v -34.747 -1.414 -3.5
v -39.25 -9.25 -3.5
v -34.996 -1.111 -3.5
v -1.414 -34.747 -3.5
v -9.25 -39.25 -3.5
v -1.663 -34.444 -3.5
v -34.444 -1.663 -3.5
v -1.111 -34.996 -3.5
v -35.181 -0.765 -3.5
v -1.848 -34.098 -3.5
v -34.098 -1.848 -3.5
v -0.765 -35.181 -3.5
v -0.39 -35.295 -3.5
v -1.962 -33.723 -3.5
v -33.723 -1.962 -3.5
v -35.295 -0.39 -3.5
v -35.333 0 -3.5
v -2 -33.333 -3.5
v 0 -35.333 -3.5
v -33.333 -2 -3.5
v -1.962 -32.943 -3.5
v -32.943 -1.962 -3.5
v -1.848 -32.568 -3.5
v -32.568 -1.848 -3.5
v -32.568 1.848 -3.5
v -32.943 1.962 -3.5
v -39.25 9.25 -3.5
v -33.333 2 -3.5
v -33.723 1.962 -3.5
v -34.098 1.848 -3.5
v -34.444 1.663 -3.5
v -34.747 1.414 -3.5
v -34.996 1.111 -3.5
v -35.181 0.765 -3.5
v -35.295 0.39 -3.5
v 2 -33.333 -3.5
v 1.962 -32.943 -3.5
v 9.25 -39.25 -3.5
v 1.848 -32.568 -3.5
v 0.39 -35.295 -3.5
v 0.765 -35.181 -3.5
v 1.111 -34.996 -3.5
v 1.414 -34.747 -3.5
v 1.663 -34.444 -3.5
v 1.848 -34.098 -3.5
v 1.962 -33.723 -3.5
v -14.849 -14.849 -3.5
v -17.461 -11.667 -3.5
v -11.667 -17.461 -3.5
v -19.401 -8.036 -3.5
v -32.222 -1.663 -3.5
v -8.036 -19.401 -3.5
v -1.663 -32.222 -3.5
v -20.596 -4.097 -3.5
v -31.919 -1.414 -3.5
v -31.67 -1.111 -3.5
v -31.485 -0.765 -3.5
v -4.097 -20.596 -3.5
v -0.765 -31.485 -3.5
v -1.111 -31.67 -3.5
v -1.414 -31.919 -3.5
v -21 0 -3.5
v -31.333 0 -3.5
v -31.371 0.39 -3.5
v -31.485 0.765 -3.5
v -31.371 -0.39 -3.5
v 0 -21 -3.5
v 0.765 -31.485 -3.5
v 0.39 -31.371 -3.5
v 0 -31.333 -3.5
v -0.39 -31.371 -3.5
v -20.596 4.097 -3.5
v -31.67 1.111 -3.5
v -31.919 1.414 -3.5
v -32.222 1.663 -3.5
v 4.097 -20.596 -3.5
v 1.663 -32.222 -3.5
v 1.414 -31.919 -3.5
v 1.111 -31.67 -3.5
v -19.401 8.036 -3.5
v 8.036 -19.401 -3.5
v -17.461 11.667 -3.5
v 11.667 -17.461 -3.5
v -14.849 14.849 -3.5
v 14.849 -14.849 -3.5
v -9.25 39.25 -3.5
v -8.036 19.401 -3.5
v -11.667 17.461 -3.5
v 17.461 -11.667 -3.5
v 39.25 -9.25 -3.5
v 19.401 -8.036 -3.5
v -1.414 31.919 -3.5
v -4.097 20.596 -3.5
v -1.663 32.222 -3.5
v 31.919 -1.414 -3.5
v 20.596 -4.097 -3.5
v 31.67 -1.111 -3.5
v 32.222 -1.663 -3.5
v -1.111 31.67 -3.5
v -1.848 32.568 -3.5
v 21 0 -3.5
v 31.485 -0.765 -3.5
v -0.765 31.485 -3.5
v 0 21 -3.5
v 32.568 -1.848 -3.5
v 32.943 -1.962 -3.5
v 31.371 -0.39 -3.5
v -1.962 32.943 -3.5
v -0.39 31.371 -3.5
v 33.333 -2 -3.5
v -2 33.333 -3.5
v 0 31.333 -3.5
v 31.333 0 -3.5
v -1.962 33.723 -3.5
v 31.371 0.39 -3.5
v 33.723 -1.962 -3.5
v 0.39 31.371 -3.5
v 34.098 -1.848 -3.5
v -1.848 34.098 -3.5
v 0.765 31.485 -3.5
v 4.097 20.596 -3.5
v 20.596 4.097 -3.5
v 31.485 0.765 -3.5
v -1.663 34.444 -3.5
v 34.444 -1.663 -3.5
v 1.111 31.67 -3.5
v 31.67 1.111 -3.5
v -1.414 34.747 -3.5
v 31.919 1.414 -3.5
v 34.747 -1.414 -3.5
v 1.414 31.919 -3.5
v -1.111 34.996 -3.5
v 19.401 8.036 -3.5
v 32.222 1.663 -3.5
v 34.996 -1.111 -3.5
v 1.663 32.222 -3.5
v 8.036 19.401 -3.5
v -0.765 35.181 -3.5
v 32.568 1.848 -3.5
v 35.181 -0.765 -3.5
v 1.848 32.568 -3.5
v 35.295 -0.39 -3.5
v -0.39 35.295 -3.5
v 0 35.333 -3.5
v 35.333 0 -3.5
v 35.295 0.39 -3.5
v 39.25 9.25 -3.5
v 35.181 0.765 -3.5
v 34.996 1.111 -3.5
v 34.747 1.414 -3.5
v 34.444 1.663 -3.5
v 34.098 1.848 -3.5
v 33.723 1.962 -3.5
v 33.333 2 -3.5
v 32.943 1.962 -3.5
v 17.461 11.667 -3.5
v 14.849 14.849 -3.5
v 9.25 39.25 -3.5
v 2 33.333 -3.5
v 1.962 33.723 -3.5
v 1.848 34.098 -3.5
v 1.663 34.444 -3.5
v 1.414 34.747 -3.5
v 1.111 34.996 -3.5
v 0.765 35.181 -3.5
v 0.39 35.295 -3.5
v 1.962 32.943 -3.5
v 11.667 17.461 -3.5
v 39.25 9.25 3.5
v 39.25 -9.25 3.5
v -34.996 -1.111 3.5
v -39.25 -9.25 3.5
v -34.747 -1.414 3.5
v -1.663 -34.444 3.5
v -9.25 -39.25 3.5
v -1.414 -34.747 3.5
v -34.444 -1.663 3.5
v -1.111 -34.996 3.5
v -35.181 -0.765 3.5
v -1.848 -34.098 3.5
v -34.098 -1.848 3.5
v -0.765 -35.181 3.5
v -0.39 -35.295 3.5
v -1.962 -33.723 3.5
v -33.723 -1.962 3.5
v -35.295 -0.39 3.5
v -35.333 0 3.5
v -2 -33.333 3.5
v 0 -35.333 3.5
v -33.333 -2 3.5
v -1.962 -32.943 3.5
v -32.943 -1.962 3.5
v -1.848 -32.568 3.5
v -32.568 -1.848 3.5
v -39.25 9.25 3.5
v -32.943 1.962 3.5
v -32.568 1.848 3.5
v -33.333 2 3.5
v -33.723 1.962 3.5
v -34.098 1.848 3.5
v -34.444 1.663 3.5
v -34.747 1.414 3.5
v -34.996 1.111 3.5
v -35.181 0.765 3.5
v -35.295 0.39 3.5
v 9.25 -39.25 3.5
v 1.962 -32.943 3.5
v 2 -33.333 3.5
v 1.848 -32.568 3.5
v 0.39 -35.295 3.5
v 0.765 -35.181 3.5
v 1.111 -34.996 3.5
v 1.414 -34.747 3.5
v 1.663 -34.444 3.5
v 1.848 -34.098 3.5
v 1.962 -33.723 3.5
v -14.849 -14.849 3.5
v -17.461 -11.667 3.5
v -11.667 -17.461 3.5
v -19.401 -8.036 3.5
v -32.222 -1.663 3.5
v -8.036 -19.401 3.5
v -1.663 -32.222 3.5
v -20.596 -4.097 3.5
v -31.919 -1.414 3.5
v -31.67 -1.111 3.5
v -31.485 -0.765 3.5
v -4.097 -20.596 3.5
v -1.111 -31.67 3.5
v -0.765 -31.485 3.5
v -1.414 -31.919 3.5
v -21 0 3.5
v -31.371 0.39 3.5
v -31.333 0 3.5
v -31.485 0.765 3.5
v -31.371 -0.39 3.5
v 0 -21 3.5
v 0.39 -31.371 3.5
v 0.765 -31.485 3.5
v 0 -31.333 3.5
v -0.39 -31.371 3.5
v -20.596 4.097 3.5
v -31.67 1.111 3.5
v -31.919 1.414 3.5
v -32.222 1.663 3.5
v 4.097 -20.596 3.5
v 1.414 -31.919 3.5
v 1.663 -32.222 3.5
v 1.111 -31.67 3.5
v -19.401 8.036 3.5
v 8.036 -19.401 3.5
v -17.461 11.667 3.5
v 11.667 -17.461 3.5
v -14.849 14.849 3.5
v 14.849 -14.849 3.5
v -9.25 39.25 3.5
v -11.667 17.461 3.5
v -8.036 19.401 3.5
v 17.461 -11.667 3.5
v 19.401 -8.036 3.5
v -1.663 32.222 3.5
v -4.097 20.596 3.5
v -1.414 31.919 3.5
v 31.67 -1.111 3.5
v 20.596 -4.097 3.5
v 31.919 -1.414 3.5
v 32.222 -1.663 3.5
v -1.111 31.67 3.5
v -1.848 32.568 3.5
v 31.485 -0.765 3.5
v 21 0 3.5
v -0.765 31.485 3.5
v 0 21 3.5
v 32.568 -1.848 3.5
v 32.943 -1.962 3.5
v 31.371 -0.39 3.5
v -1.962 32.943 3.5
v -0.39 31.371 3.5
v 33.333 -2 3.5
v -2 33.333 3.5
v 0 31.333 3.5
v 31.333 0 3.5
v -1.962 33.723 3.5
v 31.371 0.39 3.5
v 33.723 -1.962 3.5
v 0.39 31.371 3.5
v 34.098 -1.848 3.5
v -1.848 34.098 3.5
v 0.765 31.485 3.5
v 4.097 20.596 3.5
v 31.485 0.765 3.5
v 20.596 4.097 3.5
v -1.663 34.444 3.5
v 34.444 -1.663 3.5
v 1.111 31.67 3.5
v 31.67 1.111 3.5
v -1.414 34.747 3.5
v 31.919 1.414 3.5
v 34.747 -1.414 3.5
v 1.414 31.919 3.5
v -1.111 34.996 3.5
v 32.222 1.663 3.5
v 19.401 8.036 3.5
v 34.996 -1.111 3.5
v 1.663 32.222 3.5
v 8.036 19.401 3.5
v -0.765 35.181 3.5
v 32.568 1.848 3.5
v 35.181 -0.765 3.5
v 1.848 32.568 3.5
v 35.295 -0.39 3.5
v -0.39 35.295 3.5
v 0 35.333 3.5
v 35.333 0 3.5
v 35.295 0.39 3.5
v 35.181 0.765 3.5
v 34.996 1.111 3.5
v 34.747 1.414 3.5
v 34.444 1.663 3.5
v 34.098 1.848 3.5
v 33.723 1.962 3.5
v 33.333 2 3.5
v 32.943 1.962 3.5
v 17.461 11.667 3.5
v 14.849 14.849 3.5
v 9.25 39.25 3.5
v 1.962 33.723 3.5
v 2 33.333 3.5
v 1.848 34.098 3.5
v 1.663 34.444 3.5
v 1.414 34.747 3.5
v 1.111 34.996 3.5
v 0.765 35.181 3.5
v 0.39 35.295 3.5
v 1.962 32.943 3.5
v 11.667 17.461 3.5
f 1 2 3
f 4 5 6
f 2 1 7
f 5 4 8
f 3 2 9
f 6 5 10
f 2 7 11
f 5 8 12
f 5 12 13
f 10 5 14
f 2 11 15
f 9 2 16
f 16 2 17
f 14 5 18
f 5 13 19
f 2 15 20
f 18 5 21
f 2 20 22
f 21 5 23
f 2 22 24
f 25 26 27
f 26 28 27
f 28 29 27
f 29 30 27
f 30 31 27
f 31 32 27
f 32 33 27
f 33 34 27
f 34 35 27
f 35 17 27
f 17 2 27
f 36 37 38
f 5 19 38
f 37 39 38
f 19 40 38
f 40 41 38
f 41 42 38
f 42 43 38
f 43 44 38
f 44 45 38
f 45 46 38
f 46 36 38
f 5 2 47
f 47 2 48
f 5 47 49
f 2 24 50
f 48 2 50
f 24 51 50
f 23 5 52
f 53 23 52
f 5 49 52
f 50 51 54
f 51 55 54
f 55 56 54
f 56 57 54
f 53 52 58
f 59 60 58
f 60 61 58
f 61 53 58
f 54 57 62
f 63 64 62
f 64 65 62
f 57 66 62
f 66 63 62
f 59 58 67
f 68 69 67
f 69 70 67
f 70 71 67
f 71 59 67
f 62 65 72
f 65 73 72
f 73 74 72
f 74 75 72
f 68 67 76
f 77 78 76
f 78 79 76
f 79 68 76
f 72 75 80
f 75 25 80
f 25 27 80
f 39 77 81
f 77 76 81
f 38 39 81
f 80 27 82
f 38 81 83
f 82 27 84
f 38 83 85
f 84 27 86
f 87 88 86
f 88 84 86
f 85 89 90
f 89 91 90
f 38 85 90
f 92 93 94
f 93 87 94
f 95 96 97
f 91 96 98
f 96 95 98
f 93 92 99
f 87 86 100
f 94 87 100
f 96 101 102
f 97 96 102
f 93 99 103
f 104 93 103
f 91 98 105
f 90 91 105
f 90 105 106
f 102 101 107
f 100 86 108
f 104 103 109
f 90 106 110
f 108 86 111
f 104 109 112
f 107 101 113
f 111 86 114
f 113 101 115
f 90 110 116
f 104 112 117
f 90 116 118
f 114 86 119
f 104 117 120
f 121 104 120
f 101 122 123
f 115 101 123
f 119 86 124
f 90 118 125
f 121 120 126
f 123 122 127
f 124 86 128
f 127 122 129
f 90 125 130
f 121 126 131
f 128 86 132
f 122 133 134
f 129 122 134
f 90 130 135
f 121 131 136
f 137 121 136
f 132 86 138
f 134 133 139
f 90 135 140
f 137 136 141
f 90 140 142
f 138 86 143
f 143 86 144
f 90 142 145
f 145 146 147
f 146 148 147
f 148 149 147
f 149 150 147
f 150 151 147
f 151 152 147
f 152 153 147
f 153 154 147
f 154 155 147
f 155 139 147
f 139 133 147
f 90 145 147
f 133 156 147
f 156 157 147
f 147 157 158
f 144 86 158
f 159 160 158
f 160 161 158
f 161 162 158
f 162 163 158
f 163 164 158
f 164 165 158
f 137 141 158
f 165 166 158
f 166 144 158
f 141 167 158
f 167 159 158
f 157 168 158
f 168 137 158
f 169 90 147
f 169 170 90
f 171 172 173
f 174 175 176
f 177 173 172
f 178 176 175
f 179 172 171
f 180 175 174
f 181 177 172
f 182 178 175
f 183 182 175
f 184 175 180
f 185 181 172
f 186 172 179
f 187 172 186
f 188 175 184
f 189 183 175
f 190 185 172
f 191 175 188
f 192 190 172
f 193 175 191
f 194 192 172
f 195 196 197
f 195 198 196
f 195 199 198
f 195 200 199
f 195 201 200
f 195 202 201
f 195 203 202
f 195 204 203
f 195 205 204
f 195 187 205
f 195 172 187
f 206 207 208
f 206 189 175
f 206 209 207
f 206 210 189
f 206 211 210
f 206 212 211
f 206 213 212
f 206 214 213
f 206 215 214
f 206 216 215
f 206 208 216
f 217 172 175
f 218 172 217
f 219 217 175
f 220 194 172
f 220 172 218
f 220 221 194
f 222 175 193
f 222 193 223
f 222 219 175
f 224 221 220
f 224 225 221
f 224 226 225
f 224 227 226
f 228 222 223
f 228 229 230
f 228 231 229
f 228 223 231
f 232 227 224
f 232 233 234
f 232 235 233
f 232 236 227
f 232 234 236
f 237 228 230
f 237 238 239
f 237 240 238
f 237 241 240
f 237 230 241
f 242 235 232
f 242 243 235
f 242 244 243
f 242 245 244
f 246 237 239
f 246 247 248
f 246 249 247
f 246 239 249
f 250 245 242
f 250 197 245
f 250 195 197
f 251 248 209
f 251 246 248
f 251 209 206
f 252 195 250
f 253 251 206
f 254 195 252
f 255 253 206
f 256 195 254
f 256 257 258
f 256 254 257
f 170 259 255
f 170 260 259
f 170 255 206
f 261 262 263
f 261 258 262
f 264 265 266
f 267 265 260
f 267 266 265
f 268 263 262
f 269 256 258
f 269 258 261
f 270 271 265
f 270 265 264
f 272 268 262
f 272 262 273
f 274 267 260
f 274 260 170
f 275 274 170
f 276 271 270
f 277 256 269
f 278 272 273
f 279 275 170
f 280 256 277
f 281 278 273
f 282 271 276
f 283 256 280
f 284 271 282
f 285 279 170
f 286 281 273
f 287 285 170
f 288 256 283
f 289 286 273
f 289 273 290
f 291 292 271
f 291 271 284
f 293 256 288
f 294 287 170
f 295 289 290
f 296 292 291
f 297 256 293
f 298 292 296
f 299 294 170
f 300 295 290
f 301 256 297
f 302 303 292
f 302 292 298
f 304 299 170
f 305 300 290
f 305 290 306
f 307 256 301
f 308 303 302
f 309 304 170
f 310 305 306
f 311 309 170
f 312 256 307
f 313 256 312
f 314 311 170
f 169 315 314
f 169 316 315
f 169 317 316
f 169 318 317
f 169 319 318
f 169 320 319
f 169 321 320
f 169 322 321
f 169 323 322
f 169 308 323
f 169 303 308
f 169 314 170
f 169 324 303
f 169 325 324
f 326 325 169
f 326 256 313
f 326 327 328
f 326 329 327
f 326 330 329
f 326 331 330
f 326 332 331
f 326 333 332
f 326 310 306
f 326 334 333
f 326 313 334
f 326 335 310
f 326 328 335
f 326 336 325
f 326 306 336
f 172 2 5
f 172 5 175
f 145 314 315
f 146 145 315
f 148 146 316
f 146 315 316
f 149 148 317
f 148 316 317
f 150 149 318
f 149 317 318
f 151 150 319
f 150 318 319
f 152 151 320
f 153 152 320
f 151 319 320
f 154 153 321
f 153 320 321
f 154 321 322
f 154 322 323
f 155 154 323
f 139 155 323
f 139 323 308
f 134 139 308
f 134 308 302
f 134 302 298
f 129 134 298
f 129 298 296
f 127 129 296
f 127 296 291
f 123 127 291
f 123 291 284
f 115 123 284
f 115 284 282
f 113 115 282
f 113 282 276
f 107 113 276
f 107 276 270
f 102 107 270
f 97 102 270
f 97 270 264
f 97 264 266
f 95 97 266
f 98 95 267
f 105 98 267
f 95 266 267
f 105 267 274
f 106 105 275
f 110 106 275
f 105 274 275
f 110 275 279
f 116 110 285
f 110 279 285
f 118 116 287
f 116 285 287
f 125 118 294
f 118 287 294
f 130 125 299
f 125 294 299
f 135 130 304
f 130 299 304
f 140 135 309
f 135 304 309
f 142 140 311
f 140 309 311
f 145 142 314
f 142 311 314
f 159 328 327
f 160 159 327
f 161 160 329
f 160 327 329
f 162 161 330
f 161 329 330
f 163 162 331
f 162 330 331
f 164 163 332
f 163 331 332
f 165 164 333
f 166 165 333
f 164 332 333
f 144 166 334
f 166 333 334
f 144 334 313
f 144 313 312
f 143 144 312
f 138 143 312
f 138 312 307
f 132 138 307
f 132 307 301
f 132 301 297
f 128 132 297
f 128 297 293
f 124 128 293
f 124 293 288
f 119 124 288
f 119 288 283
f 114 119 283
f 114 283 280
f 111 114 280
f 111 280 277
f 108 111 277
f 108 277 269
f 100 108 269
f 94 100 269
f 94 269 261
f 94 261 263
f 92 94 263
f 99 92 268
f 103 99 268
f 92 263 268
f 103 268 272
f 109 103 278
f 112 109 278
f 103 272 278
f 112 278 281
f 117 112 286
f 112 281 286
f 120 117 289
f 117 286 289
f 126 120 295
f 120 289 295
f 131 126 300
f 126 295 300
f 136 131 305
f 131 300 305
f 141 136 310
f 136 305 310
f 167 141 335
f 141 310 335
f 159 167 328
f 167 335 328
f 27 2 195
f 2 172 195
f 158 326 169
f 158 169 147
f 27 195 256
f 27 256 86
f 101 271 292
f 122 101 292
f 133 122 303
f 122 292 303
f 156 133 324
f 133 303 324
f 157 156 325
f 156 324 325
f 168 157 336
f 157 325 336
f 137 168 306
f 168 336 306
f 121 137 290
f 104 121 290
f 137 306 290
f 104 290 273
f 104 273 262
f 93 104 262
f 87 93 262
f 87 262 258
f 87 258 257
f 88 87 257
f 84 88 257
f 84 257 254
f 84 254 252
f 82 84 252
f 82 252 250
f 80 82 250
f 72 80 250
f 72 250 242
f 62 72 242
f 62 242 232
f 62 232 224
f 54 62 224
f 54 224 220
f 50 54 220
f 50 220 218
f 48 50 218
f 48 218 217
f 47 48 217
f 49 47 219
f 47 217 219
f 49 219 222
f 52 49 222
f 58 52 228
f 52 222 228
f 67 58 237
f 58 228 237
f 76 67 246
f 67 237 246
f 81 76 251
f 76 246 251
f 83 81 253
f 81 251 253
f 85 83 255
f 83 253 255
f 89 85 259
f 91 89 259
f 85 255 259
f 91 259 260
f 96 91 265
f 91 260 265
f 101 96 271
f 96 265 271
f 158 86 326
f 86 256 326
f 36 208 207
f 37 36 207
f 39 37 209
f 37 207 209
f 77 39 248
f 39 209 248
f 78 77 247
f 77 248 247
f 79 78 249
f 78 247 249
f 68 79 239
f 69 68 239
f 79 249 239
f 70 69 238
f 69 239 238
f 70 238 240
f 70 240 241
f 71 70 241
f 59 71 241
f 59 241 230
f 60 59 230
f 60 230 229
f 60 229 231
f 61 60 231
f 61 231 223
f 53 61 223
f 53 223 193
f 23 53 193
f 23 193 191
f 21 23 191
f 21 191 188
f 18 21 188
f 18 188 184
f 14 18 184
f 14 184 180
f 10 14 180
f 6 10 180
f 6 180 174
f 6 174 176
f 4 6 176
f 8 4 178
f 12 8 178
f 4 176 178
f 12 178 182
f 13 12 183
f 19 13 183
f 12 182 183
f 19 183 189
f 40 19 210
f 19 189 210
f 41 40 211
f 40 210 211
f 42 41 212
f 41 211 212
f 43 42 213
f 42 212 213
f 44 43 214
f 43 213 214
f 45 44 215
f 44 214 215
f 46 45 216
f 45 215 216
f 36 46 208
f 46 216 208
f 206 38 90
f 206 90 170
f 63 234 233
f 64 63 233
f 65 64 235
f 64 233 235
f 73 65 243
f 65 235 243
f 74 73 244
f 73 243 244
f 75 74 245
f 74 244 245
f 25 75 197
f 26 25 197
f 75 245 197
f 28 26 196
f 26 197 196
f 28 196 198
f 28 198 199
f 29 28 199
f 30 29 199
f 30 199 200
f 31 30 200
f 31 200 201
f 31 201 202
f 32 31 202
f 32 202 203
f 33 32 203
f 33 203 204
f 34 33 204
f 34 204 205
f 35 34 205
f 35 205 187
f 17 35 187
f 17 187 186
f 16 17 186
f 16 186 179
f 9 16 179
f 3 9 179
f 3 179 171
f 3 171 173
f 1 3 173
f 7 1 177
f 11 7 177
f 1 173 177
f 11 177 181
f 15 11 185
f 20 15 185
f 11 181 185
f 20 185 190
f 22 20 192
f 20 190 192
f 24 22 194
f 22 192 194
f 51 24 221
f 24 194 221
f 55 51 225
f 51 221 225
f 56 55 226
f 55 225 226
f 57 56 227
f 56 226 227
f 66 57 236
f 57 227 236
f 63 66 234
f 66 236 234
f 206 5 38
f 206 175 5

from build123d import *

# Parameters (mm, degrees)
SKETCH1_W           = 78.5
SKETCH1_H           = 78.5
BOSS_EXTRUDE1_DEPTH = 3.5
SKETCH3_R           = 21
CUT_EXTRUDE2_DEPTH  = 56.947520052
SKETCH4_R           = 2
CUT_EXTRUDE3_DEPTH  = 56.947520052
CHAMFER1_SIZE       = 30


with BuildPart() as part:
    # Sketch1 → Boss-Extrude1 (new, symmetric)
    with BuildSketch(Plane.XY):
        Rectangle(SKETCH1_W, SKETCH1_H)
    extrude(amount=BOSS_EXTRUDE1_DEPTH, both=True)

    # Sketch3 → Cut-Extrude2 (cut, through all)
    with BuildSketch(Plane.XY.offset(3.5)):
        Circle(SKETCH3_R)
    extrude(amount=-CUT_EXTRUDE2_DEPTH, mode=Mode.SUBTRACT)

    # Sketch4 → Cut-Extrude3 (cut, through all)
    with BuildSketch(Plane.XY.offset(3.5)):
        with Locations((0, 33.333013665)):
            Circle(SKETCH4_R)
        with Locations((-33.333013665, 0)):
            Circle(SKETCH4_R)
        with Locations((0, -33.333013665)):
            Circle(SKETCH4_R)
        with Locations((33.333013665, 0)):
            Circle(SKETCH4_R)
    extrude(amount=-CUT_EXTRUDE3_DEPTH, mode=Mode.SUBTRACT)

    # Chamfer1
    chamfer1_edges = [part.edges().sort_by_distance(p)[0] for p in [
        (39.25, -39.25, 0),
        (-39.25, -39.25, 0),
        (-39.25, 39.25, 0),
        (39.25, 39.25, 0),
    ]]
    chamfer(chamfer1_edges, length=CHAMFER1_SIZE)


solid = part.part
